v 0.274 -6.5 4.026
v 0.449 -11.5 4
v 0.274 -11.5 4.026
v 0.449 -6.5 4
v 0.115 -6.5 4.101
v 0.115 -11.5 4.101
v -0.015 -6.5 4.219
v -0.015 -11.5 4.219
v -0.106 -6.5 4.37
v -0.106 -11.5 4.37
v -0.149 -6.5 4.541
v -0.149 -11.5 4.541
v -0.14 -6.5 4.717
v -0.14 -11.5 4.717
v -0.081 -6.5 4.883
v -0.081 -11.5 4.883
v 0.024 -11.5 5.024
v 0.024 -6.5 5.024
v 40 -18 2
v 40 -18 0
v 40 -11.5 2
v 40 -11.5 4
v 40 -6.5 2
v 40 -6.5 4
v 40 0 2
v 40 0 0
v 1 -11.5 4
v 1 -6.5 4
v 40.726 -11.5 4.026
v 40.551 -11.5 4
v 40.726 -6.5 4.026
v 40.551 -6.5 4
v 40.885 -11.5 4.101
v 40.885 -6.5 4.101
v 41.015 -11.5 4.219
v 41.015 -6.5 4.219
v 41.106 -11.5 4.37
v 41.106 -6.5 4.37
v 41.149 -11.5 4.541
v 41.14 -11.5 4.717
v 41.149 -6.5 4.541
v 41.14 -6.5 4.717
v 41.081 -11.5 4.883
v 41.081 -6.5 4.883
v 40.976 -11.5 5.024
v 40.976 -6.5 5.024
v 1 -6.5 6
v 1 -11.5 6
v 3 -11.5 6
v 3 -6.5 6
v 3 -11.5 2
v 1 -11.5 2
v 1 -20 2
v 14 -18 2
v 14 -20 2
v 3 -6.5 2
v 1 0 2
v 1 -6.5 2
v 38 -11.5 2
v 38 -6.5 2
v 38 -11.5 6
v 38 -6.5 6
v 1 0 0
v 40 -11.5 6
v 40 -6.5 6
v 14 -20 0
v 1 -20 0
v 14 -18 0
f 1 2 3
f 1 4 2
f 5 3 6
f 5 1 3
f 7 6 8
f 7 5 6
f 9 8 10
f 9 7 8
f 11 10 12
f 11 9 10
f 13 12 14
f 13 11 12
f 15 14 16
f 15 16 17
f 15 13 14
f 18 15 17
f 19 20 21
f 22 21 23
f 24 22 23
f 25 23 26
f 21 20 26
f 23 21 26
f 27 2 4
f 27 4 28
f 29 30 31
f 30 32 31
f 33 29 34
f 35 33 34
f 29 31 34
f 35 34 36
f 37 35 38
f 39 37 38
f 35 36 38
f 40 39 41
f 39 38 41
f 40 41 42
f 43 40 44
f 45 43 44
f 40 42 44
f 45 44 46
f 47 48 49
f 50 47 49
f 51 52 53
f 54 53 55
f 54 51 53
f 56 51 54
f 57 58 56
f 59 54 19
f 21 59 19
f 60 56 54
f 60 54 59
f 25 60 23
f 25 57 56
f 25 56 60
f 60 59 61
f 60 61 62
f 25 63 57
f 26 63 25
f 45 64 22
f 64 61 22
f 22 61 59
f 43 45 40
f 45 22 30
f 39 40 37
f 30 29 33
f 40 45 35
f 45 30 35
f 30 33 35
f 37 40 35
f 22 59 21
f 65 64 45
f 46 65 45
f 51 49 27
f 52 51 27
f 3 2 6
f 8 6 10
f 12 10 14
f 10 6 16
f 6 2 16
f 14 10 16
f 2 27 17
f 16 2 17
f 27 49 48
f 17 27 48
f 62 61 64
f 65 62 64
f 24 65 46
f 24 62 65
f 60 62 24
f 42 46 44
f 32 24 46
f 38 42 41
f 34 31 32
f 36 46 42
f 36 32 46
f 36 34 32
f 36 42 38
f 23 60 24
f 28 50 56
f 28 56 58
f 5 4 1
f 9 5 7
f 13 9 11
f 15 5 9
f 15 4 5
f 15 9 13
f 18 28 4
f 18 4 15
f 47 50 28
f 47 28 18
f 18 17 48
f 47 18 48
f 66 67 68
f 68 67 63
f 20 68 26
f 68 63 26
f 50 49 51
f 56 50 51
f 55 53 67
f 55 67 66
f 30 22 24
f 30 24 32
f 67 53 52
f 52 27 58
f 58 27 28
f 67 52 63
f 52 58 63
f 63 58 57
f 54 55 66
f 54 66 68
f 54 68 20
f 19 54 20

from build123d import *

# Parameters (mm, degrees)
SKETCH1_W           = 40
SKETCH1_H           = 18
BOSS_EXTRUDE1_DEPTH = 2
SKETCH2_W           = 2
SKETCH2_H           = 5
BOSS_EXTRUDE2_DEPTH = 2
BOSS_EXTRUDE3_DEPTH = 5
FILLET1_R           = 0.6
SKETCH4_W           = 13
SKETCH4_H           = 2
BOSS_EXTRUDE4_DEPTH = 2
SKETCH5_W           = 1
SKETCH5_H           = 20
CUT_EXTRUDE1_DEPTH  = 10
SKETCH6_W           = 1
SKETCH6_H           = 2
BOSS_EXTRUDE5_DEPTH = 2


with BuildPart() as part:
    # Sketch1 → Boss-Extrude1 (new body)
    with BuildSketch(Plane.XY):
        with Locations((20, -9)):
            Rectangle(SKETCH1_W, SKETCH1_H)
    extrude(amount=BOSS_EXTRUDE1_DEPTH)

    # Sketch2 → Boss-Extrude2 (add)
    with BuildSketch(Plane.XY.offset(2)):
        with Locations((2, -9)):
            Rectangle(SKETCH2_W, SKETCH2_H)
        with Locations((39, -9)):
            Rectangle(SKETCH2_W, SKETCH2_H)
    extrude(amount=BOSS_EXTRUDE2_DEPTH)

    # Sketch3 → Boss-Extrude3 (add)
    with BuildSketch(Plane.XZ.offset(11.5)):
        Polygon((0, 4), (-1, 4), (1, 6), (3, 6), (3, 4), align=None)
        Polygon((38, 4), (38, 6), (40, 6), (42, 4), (40, 4), align=None)
    extrude(amount=-BOSS_EXTRUDE3_DEPTH)

    # Fillet1
    fillet1_edges = [part.edges().sort_by_distance(p)[0] for p in [
        (-1, -9, 4),
        (42, -9, 4),
    ]]
    fillet(fillet1_edges, radius=FILLET1_R)

    # Sketch4 → Boss-Extrude4 (add)
    with BuildSketch(Plane(origin=(0, 0, 0), x_dir=(-1, 0, 0), z_dir=(0, 0, -1))):
        with Locations((-6.5, -19)):
            Rectangle(SKETCH4_W, SKETCH4_H)
    extrude(amount=-BOSS_EXTRUDE4_DEPTH)

    # Sketch5 → Cut-Extrude1 (cut)
    with BuildSketch(Plane.XY.offset(2)):
        with Locations((0.5, -10)):
            Rectangle(SKETCH5_W, SKETCH5_H)
    extrude(amount=-CUT_EXTRUDE1_DEPTH, mode=Mode.SUBTRACT)

    # Sketch6 → Boss-Extrude5 (add)
    with BuildSketch(Plane.XY.offset(2)):
        with Locations((13.5, -19)):
            Rectangle(SKETCH6_W, SKETCH6_H)
    extrude(amount=-BOSS_EXTRUDE5_DEPTH)


solid = part.part
